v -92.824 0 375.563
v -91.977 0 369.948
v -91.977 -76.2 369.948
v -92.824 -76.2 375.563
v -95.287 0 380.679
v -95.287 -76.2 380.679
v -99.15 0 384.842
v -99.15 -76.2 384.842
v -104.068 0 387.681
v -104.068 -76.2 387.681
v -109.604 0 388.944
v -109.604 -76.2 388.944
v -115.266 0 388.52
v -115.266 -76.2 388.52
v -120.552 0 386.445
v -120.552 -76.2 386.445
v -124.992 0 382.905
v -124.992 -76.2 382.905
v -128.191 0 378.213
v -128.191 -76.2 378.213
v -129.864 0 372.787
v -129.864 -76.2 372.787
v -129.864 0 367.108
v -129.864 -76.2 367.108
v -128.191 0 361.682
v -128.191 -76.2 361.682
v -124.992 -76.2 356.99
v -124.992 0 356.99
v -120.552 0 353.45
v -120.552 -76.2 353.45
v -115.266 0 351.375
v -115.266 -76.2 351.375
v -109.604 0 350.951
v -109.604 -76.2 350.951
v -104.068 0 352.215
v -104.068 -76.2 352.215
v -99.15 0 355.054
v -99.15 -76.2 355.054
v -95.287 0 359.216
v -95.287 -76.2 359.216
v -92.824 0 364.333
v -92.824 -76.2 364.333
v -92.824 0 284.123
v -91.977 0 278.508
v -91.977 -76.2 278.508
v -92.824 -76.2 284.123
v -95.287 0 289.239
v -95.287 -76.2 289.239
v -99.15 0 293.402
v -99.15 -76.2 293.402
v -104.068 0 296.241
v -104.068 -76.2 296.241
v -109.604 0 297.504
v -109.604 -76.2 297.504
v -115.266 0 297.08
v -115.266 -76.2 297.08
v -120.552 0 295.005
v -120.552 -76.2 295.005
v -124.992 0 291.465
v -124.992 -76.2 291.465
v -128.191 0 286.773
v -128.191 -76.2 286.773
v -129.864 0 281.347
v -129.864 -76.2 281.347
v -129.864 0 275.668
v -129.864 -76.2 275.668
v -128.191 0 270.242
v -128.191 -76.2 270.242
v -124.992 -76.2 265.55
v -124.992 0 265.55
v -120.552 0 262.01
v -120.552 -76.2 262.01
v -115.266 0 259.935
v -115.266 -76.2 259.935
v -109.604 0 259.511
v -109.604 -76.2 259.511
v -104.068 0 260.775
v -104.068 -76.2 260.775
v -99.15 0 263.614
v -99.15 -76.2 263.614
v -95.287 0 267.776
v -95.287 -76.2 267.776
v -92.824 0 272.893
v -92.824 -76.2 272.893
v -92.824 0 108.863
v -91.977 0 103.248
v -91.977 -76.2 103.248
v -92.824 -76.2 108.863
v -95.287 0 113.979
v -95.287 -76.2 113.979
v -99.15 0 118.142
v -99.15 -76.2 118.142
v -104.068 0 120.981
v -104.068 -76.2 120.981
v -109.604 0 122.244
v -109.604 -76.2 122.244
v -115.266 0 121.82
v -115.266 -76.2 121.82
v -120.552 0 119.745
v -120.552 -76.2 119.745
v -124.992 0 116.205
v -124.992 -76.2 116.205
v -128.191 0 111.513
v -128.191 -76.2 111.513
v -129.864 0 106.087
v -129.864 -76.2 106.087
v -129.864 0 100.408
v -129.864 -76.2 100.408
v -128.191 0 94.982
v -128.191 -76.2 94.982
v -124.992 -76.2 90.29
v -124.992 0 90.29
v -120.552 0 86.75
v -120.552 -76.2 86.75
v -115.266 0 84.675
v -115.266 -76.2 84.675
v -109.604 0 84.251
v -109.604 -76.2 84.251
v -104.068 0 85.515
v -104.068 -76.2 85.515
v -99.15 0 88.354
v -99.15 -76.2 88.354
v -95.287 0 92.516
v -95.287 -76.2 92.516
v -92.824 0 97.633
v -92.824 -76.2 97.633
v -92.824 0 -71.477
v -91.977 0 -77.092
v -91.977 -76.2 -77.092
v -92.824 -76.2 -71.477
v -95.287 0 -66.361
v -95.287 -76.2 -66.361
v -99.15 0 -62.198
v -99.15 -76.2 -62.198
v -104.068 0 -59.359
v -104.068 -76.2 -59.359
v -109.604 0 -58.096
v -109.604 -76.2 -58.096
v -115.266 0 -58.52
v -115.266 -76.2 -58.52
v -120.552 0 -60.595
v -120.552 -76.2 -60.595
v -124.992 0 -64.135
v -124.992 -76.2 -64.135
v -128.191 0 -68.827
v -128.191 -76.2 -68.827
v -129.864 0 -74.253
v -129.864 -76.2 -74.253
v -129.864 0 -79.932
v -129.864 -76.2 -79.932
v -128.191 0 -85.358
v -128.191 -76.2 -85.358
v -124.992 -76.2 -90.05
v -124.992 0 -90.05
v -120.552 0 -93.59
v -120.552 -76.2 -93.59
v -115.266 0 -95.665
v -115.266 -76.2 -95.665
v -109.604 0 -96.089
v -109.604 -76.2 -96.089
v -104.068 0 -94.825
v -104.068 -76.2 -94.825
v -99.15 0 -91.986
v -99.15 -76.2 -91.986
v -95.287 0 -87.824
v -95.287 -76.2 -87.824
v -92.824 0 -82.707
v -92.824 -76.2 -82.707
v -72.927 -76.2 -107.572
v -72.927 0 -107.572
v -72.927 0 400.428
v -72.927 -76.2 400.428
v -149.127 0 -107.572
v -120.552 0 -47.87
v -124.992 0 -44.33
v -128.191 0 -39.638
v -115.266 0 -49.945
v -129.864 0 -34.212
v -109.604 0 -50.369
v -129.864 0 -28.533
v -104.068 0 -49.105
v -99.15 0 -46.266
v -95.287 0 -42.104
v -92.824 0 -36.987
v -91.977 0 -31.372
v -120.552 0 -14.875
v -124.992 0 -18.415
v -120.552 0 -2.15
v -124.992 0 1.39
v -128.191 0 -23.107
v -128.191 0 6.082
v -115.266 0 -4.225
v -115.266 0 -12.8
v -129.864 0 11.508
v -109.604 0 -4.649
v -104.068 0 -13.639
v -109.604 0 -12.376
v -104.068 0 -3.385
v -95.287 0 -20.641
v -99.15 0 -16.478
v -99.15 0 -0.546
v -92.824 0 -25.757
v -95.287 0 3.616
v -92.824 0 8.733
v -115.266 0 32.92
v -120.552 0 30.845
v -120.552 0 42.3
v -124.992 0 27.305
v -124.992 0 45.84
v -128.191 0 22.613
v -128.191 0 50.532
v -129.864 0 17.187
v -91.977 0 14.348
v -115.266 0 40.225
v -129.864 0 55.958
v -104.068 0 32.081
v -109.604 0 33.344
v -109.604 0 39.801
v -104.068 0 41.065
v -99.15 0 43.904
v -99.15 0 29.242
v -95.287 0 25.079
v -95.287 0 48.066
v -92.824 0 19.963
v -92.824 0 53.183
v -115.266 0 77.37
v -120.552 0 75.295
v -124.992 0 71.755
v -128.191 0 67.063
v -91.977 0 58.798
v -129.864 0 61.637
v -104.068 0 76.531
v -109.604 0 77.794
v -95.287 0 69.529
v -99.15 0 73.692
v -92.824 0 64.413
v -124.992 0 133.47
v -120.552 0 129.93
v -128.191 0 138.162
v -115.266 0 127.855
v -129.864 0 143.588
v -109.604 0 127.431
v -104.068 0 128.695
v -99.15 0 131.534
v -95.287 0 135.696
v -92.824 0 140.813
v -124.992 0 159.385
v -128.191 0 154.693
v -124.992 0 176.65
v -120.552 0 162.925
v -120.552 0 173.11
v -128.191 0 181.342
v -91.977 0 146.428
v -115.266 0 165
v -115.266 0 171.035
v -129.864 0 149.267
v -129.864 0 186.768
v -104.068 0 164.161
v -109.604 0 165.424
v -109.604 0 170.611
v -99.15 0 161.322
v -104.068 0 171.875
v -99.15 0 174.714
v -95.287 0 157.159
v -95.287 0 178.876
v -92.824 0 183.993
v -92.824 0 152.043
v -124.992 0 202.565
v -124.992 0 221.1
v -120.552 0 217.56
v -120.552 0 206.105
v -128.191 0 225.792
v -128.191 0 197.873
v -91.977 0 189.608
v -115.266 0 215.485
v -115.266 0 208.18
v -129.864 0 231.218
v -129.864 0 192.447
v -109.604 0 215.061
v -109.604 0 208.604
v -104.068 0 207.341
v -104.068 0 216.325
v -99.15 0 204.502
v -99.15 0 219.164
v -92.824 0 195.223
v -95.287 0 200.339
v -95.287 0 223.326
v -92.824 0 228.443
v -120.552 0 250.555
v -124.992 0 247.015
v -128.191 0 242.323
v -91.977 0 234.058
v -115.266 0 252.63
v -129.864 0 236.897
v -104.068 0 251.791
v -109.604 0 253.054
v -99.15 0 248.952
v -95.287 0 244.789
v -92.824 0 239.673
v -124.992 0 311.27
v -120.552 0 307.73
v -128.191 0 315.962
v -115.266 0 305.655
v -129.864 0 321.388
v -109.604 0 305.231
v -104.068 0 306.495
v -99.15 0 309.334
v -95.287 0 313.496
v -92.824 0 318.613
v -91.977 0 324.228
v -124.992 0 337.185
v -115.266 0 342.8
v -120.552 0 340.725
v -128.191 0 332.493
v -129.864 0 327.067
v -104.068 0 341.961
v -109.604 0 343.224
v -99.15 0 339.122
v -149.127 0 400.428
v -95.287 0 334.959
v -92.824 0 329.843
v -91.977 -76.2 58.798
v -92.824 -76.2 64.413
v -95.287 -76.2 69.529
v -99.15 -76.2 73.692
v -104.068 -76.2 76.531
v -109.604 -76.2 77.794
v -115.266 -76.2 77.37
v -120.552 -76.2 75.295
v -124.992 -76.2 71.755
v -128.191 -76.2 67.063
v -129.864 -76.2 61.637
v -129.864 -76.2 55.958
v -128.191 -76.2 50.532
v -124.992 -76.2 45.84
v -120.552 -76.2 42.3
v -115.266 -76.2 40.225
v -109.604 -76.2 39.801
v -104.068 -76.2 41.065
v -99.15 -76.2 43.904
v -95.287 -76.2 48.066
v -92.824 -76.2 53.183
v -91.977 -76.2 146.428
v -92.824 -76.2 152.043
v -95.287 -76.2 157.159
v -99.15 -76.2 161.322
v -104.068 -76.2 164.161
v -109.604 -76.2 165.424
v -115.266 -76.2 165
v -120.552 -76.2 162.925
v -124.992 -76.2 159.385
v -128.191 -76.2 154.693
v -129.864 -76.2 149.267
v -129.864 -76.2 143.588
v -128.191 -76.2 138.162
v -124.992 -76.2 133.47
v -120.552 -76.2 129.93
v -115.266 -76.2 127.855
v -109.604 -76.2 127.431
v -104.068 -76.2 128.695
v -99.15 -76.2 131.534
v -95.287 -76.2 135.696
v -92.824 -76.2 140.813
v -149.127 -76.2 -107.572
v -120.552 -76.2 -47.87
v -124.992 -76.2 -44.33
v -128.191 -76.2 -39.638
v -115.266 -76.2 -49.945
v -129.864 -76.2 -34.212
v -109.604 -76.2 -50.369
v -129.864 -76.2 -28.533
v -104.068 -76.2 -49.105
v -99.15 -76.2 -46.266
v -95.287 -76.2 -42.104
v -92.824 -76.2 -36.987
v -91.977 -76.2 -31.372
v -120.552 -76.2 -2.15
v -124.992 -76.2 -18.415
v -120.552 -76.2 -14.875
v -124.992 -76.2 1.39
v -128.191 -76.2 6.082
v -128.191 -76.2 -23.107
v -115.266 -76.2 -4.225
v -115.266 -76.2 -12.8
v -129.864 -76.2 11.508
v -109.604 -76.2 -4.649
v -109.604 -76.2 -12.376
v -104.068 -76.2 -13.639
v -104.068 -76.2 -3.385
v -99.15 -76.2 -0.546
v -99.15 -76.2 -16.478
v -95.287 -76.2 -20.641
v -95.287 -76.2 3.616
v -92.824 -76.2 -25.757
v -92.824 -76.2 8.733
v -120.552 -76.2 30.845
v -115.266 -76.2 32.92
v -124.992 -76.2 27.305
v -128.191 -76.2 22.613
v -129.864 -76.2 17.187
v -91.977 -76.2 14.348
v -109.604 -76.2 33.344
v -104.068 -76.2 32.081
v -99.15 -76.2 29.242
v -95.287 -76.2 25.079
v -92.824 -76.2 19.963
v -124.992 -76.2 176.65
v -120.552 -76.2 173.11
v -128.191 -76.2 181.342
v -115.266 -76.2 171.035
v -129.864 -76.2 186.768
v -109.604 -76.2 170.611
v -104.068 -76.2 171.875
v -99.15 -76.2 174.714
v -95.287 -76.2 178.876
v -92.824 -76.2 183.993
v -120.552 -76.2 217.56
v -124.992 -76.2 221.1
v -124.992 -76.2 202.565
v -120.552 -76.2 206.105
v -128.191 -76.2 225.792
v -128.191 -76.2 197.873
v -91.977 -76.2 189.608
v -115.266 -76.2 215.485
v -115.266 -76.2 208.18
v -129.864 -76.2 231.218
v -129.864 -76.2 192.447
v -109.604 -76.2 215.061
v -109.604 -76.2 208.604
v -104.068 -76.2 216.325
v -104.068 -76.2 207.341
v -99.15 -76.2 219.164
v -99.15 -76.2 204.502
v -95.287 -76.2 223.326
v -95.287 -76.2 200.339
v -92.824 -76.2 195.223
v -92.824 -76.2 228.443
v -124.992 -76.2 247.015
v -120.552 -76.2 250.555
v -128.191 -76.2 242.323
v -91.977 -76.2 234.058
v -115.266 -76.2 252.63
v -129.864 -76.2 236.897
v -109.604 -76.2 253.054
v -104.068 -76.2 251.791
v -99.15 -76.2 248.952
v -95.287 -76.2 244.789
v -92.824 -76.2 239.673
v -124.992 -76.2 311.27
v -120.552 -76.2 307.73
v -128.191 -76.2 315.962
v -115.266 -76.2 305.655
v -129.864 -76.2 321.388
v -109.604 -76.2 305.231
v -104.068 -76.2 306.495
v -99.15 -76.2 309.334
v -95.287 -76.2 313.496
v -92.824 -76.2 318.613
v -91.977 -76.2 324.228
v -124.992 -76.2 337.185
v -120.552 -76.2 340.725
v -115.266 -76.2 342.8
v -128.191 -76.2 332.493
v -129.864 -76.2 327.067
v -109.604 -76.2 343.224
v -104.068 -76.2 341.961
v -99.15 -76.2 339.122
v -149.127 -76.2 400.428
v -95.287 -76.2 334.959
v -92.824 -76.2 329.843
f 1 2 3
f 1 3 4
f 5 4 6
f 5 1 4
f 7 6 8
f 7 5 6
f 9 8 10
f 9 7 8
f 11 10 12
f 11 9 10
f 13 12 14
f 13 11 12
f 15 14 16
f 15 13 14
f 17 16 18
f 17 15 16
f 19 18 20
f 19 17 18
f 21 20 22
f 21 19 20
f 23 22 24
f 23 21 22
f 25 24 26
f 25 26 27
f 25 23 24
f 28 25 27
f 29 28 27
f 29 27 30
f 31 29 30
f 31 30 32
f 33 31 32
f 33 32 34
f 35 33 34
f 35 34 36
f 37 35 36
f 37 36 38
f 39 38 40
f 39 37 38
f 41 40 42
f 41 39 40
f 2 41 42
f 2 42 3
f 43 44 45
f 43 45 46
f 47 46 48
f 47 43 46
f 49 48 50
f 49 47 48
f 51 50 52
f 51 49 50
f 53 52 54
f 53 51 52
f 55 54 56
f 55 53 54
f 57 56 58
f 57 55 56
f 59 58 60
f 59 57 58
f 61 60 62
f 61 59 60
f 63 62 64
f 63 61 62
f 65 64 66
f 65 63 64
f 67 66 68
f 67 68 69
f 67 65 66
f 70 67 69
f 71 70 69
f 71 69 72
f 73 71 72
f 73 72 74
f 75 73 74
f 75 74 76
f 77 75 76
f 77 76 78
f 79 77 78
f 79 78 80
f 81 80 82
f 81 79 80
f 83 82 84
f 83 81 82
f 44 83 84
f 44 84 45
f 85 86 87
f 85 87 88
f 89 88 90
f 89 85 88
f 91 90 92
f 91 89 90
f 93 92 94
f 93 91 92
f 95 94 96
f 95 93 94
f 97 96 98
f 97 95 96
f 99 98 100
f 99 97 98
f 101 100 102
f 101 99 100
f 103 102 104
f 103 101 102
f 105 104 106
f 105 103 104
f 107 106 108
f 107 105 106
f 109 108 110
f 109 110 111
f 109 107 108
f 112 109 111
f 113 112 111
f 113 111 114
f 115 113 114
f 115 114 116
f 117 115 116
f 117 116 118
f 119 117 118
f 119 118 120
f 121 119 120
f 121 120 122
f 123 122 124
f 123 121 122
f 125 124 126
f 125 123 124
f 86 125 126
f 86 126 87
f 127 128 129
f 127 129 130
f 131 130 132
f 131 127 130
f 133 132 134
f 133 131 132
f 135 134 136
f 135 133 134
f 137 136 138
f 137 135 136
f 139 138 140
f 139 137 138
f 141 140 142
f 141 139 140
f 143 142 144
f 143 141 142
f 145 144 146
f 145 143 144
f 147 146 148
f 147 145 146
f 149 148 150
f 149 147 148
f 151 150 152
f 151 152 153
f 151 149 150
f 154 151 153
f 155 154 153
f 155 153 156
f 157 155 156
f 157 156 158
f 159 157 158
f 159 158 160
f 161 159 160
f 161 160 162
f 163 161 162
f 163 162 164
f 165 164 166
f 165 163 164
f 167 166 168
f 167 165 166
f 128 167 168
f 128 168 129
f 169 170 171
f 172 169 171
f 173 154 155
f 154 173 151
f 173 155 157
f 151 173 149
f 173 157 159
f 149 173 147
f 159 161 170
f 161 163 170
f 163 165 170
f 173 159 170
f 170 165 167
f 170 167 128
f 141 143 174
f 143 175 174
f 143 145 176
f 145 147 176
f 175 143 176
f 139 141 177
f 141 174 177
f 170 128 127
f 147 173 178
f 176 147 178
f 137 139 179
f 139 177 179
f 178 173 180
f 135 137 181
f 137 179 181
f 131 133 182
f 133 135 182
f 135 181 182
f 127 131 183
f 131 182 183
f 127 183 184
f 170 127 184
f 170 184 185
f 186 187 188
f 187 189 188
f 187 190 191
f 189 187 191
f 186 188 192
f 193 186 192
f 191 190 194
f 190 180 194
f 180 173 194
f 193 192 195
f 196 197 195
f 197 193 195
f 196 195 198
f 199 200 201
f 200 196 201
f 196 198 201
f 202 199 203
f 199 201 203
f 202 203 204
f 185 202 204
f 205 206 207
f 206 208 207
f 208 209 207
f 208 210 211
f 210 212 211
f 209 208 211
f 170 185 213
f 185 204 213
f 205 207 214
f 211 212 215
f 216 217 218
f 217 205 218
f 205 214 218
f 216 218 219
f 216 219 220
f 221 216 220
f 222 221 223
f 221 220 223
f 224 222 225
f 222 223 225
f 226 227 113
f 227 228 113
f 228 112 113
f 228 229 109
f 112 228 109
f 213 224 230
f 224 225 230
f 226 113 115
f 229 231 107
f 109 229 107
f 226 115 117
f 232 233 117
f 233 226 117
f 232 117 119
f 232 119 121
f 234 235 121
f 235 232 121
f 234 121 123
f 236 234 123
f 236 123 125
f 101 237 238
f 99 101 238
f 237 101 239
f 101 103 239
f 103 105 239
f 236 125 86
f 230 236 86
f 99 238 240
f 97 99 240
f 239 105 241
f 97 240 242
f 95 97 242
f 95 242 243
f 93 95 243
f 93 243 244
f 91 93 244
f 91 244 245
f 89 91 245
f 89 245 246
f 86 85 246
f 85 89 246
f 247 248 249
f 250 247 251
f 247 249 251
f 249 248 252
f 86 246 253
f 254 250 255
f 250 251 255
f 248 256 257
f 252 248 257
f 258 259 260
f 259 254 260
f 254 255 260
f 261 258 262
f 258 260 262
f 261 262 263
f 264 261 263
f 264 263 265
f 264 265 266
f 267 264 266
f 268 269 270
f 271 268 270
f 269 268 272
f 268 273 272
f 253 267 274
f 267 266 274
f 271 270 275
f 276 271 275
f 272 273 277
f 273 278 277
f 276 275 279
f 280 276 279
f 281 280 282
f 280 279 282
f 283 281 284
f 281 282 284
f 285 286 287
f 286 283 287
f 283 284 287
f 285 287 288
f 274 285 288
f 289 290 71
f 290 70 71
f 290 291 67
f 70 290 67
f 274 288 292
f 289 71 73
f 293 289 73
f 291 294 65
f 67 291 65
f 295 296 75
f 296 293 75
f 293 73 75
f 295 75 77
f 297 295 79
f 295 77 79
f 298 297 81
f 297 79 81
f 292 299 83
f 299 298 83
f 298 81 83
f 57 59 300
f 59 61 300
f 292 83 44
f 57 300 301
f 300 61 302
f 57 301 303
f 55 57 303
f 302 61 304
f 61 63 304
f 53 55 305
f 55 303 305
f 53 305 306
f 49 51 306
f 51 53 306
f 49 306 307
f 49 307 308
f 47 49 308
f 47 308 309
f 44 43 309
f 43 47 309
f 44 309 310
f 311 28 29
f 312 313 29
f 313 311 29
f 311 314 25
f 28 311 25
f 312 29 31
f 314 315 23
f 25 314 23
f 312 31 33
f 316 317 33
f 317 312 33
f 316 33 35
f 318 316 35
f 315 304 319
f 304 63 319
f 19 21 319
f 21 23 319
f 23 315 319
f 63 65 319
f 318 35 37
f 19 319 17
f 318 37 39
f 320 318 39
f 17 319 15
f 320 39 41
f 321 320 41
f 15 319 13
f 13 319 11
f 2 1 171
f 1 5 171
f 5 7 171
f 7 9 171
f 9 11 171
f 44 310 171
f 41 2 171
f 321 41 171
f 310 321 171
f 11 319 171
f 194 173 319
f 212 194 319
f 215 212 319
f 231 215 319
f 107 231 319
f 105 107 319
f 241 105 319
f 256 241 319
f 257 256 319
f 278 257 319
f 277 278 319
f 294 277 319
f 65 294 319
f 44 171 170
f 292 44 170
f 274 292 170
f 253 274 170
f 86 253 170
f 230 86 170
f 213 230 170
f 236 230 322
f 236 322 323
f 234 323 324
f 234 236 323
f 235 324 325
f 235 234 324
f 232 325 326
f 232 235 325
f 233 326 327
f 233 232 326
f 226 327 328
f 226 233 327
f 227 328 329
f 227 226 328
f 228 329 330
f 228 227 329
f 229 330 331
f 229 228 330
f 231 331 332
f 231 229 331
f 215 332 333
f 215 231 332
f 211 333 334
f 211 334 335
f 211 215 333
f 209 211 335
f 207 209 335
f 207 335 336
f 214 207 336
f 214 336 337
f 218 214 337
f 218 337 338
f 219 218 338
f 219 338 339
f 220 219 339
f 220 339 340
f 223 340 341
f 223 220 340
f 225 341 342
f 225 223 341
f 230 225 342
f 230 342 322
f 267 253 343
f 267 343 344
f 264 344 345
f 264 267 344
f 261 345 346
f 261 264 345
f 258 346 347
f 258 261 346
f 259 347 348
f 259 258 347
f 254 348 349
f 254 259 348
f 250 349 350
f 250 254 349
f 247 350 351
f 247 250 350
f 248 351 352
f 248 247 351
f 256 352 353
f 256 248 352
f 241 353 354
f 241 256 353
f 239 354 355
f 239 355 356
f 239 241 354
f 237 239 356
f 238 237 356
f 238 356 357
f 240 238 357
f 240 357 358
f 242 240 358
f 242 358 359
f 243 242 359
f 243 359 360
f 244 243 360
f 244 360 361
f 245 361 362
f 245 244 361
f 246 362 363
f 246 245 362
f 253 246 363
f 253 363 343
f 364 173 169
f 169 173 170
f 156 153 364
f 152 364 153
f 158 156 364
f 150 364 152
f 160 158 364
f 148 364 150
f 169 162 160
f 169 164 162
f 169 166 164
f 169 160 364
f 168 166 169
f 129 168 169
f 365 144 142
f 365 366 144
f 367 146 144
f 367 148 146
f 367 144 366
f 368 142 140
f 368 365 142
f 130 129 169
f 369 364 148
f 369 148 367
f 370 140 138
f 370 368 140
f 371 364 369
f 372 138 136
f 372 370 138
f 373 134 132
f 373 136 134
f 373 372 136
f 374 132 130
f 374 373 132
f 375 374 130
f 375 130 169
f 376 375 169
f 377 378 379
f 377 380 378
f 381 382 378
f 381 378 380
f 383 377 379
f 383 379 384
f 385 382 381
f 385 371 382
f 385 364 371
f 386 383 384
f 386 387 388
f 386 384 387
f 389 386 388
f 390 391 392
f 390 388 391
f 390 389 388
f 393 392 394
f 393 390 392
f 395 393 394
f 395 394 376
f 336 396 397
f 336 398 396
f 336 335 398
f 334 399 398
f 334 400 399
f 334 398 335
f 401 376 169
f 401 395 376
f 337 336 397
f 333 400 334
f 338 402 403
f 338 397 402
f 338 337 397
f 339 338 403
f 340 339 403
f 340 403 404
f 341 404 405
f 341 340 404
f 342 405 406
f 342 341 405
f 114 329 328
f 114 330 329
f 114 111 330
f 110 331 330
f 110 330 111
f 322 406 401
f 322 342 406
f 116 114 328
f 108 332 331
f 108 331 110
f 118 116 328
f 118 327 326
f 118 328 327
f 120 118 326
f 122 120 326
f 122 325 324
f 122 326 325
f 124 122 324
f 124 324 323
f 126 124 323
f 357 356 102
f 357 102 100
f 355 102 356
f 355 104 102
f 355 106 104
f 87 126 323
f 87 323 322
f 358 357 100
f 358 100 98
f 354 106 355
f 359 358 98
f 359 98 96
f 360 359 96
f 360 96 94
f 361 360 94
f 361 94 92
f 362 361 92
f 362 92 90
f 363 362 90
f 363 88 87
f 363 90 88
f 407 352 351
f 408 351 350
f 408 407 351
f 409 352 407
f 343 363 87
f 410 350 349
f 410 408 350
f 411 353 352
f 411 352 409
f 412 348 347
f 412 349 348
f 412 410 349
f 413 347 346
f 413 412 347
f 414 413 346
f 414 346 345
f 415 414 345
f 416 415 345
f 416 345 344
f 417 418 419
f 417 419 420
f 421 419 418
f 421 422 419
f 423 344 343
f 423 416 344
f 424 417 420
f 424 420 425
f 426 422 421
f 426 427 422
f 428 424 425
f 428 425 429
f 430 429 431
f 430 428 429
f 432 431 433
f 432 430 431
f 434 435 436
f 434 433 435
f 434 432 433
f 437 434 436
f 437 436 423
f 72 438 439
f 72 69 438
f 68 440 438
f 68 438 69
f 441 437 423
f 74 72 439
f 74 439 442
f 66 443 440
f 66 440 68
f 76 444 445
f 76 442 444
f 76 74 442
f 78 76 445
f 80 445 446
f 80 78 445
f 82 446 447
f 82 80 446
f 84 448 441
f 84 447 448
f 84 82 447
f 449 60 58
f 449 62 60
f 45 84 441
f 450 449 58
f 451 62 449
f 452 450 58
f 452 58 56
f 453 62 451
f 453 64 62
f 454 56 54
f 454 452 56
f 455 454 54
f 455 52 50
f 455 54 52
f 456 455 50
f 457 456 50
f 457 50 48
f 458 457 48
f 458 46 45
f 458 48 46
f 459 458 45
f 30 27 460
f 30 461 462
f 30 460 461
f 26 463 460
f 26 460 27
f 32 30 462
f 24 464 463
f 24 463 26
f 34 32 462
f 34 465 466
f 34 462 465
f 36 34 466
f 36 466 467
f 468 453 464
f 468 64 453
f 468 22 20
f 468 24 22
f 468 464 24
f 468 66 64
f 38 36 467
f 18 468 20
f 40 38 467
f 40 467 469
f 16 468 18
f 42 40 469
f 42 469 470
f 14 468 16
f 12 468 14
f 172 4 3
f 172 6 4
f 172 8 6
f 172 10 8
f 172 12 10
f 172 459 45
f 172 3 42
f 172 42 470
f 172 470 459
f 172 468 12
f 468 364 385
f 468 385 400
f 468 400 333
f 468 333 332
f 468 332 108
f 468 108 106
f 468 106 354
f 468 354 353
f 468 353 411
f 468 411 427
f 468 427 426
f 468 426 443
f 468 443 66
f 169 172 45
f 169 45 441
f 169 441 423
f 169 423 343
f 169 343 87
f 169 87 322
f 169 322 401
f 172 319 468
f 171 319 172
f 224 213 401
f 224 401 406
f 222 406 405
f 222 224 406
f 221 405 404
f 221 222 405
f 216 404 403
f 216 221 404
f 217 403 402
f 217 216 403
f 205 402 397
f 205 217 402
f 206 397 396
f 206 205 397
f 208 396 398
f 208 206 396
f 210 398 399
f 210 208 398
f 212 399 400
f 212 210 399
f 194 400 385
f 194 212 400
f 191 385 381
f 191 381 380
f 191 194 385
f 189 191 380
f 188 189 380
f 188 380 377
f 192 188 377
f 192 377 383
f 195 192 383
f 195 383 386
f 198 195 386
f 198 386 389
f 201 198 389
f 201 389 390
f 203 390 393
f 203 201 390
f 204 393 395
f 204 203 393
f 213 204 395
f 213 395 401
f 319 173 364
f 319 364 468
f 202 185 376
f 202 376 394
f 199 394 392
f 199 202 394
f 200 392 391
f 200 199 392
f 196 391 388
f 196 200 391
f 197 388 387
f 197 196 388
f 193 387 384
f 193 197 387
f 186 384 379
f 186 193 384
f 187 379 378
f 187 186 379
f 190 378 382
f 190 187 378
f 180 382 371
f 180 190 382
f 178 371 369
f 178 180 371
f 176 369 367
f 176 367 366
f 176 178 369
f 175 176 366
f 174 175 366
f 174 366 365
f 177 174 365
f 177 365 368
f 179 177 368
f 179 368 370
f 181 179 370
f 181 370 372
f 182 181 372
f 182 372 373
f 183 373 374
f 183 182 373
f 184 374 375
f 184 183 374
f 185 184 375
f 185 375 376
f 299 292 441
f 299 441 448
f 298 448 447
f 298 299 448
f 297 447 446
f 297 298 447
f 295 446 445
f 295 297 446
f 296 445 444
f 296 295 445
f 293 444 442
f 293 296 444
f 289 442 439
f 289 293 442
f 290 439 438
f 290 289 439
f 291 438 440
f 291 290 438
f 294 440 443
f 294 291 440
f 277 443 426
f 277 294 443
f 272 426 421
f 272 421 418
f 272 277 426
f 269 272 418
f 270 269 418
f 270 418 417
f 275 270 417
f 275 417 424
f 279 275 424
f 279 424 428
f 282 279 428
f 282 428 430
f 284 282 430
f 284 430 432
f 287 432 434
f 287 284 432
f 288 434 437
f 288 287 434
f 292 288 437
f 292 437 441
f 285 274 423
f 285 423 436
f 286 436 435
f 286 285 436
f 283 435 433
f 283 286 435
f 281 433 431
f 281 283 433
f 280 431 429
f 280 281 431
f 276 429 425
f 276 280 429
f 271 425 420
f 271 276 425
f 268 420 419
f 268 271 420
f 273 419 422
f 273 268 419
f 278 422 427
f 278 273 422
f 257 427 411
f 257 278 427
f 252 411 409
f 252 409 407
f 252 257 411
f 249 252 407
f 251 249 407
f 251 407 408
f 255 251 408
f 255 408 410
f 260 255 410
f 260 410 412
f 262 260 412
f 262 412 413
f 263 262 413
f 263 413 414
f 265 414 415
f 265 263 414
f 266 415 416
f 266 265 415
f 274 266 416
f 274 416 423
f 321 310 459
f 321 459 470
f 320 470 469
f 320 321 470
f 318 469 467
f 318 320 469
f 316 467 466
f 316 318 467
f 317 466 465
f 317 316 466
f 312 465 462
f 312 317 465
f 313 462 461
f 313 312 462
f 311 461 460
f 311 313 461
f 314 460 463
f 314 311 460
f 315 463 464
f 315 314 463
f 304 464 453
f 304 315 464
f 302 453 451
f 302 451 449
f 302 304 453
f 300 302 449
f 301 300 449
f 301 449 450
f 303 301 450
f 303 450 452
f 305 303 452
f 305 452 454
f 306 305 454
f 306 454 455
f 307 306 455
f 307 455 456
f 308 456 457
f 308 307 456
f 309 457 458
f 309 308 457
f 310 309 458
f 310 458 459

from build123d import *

# Parameters (mm, degrees)
F0_W     = 76.2
F0_H     = 508
F0_R     = 19.05
F1_DEPTH = 76.2


with BuildPart() as f1:
    # F0 (on Front) → F1 (new body)
    with BuildSketch(Plane.XZ):
        with Locations((-111.027259, 146.427681)):
            Rectangle(F0_W, F0_H)
        with Locations((-111.027259, -77.092319)):
            Circle(F0_R, mode=Mode.SUBTRACT)
        with Locations((-111.027259, -31.372319)):
            Circle(F0_R, mode=Mode.SUBTRACT)
        with Locations((-111.027259, 14.347681)):
            Circle(F0_R, mode=Mode.SUBTRACT)
        with Locations((-111.027259, 58.797681)):
            Circle(F0_R, mode=Mode.SUBTRACT)
        with Locations((-111.027259, 103.247681)):
            Circle(F0_R, mode=Mode.SUBTRACT)
        with Locations((-111.027259, 146.427681)):
            Circle(F0_R, mode=Mode.SUBTRACT)
        with Locations((-111.027259, 189.607681)):
            Circle(F0_R, mode=Mode.SUBTRACT)
        with Locations((-111.027259, 234.057681)):
            Circle(F0_R, mode=Mode.SUBTRACT)
        with Locations((-111.027259, 278.507681)):
            Circle(F0_R, mode=Mode.SUBTRACT)
        with Locations((-111.027259, 324.227681)):
            Circle(F0_R, mode=Mode.SUBTRACT)
        with Locations((-111.027259, 369.947681)):
            Circle(F0_R, mode=Mode.SUBTRACT)
    extrude(amount=F1_DEPTH)


solid = f1.part
